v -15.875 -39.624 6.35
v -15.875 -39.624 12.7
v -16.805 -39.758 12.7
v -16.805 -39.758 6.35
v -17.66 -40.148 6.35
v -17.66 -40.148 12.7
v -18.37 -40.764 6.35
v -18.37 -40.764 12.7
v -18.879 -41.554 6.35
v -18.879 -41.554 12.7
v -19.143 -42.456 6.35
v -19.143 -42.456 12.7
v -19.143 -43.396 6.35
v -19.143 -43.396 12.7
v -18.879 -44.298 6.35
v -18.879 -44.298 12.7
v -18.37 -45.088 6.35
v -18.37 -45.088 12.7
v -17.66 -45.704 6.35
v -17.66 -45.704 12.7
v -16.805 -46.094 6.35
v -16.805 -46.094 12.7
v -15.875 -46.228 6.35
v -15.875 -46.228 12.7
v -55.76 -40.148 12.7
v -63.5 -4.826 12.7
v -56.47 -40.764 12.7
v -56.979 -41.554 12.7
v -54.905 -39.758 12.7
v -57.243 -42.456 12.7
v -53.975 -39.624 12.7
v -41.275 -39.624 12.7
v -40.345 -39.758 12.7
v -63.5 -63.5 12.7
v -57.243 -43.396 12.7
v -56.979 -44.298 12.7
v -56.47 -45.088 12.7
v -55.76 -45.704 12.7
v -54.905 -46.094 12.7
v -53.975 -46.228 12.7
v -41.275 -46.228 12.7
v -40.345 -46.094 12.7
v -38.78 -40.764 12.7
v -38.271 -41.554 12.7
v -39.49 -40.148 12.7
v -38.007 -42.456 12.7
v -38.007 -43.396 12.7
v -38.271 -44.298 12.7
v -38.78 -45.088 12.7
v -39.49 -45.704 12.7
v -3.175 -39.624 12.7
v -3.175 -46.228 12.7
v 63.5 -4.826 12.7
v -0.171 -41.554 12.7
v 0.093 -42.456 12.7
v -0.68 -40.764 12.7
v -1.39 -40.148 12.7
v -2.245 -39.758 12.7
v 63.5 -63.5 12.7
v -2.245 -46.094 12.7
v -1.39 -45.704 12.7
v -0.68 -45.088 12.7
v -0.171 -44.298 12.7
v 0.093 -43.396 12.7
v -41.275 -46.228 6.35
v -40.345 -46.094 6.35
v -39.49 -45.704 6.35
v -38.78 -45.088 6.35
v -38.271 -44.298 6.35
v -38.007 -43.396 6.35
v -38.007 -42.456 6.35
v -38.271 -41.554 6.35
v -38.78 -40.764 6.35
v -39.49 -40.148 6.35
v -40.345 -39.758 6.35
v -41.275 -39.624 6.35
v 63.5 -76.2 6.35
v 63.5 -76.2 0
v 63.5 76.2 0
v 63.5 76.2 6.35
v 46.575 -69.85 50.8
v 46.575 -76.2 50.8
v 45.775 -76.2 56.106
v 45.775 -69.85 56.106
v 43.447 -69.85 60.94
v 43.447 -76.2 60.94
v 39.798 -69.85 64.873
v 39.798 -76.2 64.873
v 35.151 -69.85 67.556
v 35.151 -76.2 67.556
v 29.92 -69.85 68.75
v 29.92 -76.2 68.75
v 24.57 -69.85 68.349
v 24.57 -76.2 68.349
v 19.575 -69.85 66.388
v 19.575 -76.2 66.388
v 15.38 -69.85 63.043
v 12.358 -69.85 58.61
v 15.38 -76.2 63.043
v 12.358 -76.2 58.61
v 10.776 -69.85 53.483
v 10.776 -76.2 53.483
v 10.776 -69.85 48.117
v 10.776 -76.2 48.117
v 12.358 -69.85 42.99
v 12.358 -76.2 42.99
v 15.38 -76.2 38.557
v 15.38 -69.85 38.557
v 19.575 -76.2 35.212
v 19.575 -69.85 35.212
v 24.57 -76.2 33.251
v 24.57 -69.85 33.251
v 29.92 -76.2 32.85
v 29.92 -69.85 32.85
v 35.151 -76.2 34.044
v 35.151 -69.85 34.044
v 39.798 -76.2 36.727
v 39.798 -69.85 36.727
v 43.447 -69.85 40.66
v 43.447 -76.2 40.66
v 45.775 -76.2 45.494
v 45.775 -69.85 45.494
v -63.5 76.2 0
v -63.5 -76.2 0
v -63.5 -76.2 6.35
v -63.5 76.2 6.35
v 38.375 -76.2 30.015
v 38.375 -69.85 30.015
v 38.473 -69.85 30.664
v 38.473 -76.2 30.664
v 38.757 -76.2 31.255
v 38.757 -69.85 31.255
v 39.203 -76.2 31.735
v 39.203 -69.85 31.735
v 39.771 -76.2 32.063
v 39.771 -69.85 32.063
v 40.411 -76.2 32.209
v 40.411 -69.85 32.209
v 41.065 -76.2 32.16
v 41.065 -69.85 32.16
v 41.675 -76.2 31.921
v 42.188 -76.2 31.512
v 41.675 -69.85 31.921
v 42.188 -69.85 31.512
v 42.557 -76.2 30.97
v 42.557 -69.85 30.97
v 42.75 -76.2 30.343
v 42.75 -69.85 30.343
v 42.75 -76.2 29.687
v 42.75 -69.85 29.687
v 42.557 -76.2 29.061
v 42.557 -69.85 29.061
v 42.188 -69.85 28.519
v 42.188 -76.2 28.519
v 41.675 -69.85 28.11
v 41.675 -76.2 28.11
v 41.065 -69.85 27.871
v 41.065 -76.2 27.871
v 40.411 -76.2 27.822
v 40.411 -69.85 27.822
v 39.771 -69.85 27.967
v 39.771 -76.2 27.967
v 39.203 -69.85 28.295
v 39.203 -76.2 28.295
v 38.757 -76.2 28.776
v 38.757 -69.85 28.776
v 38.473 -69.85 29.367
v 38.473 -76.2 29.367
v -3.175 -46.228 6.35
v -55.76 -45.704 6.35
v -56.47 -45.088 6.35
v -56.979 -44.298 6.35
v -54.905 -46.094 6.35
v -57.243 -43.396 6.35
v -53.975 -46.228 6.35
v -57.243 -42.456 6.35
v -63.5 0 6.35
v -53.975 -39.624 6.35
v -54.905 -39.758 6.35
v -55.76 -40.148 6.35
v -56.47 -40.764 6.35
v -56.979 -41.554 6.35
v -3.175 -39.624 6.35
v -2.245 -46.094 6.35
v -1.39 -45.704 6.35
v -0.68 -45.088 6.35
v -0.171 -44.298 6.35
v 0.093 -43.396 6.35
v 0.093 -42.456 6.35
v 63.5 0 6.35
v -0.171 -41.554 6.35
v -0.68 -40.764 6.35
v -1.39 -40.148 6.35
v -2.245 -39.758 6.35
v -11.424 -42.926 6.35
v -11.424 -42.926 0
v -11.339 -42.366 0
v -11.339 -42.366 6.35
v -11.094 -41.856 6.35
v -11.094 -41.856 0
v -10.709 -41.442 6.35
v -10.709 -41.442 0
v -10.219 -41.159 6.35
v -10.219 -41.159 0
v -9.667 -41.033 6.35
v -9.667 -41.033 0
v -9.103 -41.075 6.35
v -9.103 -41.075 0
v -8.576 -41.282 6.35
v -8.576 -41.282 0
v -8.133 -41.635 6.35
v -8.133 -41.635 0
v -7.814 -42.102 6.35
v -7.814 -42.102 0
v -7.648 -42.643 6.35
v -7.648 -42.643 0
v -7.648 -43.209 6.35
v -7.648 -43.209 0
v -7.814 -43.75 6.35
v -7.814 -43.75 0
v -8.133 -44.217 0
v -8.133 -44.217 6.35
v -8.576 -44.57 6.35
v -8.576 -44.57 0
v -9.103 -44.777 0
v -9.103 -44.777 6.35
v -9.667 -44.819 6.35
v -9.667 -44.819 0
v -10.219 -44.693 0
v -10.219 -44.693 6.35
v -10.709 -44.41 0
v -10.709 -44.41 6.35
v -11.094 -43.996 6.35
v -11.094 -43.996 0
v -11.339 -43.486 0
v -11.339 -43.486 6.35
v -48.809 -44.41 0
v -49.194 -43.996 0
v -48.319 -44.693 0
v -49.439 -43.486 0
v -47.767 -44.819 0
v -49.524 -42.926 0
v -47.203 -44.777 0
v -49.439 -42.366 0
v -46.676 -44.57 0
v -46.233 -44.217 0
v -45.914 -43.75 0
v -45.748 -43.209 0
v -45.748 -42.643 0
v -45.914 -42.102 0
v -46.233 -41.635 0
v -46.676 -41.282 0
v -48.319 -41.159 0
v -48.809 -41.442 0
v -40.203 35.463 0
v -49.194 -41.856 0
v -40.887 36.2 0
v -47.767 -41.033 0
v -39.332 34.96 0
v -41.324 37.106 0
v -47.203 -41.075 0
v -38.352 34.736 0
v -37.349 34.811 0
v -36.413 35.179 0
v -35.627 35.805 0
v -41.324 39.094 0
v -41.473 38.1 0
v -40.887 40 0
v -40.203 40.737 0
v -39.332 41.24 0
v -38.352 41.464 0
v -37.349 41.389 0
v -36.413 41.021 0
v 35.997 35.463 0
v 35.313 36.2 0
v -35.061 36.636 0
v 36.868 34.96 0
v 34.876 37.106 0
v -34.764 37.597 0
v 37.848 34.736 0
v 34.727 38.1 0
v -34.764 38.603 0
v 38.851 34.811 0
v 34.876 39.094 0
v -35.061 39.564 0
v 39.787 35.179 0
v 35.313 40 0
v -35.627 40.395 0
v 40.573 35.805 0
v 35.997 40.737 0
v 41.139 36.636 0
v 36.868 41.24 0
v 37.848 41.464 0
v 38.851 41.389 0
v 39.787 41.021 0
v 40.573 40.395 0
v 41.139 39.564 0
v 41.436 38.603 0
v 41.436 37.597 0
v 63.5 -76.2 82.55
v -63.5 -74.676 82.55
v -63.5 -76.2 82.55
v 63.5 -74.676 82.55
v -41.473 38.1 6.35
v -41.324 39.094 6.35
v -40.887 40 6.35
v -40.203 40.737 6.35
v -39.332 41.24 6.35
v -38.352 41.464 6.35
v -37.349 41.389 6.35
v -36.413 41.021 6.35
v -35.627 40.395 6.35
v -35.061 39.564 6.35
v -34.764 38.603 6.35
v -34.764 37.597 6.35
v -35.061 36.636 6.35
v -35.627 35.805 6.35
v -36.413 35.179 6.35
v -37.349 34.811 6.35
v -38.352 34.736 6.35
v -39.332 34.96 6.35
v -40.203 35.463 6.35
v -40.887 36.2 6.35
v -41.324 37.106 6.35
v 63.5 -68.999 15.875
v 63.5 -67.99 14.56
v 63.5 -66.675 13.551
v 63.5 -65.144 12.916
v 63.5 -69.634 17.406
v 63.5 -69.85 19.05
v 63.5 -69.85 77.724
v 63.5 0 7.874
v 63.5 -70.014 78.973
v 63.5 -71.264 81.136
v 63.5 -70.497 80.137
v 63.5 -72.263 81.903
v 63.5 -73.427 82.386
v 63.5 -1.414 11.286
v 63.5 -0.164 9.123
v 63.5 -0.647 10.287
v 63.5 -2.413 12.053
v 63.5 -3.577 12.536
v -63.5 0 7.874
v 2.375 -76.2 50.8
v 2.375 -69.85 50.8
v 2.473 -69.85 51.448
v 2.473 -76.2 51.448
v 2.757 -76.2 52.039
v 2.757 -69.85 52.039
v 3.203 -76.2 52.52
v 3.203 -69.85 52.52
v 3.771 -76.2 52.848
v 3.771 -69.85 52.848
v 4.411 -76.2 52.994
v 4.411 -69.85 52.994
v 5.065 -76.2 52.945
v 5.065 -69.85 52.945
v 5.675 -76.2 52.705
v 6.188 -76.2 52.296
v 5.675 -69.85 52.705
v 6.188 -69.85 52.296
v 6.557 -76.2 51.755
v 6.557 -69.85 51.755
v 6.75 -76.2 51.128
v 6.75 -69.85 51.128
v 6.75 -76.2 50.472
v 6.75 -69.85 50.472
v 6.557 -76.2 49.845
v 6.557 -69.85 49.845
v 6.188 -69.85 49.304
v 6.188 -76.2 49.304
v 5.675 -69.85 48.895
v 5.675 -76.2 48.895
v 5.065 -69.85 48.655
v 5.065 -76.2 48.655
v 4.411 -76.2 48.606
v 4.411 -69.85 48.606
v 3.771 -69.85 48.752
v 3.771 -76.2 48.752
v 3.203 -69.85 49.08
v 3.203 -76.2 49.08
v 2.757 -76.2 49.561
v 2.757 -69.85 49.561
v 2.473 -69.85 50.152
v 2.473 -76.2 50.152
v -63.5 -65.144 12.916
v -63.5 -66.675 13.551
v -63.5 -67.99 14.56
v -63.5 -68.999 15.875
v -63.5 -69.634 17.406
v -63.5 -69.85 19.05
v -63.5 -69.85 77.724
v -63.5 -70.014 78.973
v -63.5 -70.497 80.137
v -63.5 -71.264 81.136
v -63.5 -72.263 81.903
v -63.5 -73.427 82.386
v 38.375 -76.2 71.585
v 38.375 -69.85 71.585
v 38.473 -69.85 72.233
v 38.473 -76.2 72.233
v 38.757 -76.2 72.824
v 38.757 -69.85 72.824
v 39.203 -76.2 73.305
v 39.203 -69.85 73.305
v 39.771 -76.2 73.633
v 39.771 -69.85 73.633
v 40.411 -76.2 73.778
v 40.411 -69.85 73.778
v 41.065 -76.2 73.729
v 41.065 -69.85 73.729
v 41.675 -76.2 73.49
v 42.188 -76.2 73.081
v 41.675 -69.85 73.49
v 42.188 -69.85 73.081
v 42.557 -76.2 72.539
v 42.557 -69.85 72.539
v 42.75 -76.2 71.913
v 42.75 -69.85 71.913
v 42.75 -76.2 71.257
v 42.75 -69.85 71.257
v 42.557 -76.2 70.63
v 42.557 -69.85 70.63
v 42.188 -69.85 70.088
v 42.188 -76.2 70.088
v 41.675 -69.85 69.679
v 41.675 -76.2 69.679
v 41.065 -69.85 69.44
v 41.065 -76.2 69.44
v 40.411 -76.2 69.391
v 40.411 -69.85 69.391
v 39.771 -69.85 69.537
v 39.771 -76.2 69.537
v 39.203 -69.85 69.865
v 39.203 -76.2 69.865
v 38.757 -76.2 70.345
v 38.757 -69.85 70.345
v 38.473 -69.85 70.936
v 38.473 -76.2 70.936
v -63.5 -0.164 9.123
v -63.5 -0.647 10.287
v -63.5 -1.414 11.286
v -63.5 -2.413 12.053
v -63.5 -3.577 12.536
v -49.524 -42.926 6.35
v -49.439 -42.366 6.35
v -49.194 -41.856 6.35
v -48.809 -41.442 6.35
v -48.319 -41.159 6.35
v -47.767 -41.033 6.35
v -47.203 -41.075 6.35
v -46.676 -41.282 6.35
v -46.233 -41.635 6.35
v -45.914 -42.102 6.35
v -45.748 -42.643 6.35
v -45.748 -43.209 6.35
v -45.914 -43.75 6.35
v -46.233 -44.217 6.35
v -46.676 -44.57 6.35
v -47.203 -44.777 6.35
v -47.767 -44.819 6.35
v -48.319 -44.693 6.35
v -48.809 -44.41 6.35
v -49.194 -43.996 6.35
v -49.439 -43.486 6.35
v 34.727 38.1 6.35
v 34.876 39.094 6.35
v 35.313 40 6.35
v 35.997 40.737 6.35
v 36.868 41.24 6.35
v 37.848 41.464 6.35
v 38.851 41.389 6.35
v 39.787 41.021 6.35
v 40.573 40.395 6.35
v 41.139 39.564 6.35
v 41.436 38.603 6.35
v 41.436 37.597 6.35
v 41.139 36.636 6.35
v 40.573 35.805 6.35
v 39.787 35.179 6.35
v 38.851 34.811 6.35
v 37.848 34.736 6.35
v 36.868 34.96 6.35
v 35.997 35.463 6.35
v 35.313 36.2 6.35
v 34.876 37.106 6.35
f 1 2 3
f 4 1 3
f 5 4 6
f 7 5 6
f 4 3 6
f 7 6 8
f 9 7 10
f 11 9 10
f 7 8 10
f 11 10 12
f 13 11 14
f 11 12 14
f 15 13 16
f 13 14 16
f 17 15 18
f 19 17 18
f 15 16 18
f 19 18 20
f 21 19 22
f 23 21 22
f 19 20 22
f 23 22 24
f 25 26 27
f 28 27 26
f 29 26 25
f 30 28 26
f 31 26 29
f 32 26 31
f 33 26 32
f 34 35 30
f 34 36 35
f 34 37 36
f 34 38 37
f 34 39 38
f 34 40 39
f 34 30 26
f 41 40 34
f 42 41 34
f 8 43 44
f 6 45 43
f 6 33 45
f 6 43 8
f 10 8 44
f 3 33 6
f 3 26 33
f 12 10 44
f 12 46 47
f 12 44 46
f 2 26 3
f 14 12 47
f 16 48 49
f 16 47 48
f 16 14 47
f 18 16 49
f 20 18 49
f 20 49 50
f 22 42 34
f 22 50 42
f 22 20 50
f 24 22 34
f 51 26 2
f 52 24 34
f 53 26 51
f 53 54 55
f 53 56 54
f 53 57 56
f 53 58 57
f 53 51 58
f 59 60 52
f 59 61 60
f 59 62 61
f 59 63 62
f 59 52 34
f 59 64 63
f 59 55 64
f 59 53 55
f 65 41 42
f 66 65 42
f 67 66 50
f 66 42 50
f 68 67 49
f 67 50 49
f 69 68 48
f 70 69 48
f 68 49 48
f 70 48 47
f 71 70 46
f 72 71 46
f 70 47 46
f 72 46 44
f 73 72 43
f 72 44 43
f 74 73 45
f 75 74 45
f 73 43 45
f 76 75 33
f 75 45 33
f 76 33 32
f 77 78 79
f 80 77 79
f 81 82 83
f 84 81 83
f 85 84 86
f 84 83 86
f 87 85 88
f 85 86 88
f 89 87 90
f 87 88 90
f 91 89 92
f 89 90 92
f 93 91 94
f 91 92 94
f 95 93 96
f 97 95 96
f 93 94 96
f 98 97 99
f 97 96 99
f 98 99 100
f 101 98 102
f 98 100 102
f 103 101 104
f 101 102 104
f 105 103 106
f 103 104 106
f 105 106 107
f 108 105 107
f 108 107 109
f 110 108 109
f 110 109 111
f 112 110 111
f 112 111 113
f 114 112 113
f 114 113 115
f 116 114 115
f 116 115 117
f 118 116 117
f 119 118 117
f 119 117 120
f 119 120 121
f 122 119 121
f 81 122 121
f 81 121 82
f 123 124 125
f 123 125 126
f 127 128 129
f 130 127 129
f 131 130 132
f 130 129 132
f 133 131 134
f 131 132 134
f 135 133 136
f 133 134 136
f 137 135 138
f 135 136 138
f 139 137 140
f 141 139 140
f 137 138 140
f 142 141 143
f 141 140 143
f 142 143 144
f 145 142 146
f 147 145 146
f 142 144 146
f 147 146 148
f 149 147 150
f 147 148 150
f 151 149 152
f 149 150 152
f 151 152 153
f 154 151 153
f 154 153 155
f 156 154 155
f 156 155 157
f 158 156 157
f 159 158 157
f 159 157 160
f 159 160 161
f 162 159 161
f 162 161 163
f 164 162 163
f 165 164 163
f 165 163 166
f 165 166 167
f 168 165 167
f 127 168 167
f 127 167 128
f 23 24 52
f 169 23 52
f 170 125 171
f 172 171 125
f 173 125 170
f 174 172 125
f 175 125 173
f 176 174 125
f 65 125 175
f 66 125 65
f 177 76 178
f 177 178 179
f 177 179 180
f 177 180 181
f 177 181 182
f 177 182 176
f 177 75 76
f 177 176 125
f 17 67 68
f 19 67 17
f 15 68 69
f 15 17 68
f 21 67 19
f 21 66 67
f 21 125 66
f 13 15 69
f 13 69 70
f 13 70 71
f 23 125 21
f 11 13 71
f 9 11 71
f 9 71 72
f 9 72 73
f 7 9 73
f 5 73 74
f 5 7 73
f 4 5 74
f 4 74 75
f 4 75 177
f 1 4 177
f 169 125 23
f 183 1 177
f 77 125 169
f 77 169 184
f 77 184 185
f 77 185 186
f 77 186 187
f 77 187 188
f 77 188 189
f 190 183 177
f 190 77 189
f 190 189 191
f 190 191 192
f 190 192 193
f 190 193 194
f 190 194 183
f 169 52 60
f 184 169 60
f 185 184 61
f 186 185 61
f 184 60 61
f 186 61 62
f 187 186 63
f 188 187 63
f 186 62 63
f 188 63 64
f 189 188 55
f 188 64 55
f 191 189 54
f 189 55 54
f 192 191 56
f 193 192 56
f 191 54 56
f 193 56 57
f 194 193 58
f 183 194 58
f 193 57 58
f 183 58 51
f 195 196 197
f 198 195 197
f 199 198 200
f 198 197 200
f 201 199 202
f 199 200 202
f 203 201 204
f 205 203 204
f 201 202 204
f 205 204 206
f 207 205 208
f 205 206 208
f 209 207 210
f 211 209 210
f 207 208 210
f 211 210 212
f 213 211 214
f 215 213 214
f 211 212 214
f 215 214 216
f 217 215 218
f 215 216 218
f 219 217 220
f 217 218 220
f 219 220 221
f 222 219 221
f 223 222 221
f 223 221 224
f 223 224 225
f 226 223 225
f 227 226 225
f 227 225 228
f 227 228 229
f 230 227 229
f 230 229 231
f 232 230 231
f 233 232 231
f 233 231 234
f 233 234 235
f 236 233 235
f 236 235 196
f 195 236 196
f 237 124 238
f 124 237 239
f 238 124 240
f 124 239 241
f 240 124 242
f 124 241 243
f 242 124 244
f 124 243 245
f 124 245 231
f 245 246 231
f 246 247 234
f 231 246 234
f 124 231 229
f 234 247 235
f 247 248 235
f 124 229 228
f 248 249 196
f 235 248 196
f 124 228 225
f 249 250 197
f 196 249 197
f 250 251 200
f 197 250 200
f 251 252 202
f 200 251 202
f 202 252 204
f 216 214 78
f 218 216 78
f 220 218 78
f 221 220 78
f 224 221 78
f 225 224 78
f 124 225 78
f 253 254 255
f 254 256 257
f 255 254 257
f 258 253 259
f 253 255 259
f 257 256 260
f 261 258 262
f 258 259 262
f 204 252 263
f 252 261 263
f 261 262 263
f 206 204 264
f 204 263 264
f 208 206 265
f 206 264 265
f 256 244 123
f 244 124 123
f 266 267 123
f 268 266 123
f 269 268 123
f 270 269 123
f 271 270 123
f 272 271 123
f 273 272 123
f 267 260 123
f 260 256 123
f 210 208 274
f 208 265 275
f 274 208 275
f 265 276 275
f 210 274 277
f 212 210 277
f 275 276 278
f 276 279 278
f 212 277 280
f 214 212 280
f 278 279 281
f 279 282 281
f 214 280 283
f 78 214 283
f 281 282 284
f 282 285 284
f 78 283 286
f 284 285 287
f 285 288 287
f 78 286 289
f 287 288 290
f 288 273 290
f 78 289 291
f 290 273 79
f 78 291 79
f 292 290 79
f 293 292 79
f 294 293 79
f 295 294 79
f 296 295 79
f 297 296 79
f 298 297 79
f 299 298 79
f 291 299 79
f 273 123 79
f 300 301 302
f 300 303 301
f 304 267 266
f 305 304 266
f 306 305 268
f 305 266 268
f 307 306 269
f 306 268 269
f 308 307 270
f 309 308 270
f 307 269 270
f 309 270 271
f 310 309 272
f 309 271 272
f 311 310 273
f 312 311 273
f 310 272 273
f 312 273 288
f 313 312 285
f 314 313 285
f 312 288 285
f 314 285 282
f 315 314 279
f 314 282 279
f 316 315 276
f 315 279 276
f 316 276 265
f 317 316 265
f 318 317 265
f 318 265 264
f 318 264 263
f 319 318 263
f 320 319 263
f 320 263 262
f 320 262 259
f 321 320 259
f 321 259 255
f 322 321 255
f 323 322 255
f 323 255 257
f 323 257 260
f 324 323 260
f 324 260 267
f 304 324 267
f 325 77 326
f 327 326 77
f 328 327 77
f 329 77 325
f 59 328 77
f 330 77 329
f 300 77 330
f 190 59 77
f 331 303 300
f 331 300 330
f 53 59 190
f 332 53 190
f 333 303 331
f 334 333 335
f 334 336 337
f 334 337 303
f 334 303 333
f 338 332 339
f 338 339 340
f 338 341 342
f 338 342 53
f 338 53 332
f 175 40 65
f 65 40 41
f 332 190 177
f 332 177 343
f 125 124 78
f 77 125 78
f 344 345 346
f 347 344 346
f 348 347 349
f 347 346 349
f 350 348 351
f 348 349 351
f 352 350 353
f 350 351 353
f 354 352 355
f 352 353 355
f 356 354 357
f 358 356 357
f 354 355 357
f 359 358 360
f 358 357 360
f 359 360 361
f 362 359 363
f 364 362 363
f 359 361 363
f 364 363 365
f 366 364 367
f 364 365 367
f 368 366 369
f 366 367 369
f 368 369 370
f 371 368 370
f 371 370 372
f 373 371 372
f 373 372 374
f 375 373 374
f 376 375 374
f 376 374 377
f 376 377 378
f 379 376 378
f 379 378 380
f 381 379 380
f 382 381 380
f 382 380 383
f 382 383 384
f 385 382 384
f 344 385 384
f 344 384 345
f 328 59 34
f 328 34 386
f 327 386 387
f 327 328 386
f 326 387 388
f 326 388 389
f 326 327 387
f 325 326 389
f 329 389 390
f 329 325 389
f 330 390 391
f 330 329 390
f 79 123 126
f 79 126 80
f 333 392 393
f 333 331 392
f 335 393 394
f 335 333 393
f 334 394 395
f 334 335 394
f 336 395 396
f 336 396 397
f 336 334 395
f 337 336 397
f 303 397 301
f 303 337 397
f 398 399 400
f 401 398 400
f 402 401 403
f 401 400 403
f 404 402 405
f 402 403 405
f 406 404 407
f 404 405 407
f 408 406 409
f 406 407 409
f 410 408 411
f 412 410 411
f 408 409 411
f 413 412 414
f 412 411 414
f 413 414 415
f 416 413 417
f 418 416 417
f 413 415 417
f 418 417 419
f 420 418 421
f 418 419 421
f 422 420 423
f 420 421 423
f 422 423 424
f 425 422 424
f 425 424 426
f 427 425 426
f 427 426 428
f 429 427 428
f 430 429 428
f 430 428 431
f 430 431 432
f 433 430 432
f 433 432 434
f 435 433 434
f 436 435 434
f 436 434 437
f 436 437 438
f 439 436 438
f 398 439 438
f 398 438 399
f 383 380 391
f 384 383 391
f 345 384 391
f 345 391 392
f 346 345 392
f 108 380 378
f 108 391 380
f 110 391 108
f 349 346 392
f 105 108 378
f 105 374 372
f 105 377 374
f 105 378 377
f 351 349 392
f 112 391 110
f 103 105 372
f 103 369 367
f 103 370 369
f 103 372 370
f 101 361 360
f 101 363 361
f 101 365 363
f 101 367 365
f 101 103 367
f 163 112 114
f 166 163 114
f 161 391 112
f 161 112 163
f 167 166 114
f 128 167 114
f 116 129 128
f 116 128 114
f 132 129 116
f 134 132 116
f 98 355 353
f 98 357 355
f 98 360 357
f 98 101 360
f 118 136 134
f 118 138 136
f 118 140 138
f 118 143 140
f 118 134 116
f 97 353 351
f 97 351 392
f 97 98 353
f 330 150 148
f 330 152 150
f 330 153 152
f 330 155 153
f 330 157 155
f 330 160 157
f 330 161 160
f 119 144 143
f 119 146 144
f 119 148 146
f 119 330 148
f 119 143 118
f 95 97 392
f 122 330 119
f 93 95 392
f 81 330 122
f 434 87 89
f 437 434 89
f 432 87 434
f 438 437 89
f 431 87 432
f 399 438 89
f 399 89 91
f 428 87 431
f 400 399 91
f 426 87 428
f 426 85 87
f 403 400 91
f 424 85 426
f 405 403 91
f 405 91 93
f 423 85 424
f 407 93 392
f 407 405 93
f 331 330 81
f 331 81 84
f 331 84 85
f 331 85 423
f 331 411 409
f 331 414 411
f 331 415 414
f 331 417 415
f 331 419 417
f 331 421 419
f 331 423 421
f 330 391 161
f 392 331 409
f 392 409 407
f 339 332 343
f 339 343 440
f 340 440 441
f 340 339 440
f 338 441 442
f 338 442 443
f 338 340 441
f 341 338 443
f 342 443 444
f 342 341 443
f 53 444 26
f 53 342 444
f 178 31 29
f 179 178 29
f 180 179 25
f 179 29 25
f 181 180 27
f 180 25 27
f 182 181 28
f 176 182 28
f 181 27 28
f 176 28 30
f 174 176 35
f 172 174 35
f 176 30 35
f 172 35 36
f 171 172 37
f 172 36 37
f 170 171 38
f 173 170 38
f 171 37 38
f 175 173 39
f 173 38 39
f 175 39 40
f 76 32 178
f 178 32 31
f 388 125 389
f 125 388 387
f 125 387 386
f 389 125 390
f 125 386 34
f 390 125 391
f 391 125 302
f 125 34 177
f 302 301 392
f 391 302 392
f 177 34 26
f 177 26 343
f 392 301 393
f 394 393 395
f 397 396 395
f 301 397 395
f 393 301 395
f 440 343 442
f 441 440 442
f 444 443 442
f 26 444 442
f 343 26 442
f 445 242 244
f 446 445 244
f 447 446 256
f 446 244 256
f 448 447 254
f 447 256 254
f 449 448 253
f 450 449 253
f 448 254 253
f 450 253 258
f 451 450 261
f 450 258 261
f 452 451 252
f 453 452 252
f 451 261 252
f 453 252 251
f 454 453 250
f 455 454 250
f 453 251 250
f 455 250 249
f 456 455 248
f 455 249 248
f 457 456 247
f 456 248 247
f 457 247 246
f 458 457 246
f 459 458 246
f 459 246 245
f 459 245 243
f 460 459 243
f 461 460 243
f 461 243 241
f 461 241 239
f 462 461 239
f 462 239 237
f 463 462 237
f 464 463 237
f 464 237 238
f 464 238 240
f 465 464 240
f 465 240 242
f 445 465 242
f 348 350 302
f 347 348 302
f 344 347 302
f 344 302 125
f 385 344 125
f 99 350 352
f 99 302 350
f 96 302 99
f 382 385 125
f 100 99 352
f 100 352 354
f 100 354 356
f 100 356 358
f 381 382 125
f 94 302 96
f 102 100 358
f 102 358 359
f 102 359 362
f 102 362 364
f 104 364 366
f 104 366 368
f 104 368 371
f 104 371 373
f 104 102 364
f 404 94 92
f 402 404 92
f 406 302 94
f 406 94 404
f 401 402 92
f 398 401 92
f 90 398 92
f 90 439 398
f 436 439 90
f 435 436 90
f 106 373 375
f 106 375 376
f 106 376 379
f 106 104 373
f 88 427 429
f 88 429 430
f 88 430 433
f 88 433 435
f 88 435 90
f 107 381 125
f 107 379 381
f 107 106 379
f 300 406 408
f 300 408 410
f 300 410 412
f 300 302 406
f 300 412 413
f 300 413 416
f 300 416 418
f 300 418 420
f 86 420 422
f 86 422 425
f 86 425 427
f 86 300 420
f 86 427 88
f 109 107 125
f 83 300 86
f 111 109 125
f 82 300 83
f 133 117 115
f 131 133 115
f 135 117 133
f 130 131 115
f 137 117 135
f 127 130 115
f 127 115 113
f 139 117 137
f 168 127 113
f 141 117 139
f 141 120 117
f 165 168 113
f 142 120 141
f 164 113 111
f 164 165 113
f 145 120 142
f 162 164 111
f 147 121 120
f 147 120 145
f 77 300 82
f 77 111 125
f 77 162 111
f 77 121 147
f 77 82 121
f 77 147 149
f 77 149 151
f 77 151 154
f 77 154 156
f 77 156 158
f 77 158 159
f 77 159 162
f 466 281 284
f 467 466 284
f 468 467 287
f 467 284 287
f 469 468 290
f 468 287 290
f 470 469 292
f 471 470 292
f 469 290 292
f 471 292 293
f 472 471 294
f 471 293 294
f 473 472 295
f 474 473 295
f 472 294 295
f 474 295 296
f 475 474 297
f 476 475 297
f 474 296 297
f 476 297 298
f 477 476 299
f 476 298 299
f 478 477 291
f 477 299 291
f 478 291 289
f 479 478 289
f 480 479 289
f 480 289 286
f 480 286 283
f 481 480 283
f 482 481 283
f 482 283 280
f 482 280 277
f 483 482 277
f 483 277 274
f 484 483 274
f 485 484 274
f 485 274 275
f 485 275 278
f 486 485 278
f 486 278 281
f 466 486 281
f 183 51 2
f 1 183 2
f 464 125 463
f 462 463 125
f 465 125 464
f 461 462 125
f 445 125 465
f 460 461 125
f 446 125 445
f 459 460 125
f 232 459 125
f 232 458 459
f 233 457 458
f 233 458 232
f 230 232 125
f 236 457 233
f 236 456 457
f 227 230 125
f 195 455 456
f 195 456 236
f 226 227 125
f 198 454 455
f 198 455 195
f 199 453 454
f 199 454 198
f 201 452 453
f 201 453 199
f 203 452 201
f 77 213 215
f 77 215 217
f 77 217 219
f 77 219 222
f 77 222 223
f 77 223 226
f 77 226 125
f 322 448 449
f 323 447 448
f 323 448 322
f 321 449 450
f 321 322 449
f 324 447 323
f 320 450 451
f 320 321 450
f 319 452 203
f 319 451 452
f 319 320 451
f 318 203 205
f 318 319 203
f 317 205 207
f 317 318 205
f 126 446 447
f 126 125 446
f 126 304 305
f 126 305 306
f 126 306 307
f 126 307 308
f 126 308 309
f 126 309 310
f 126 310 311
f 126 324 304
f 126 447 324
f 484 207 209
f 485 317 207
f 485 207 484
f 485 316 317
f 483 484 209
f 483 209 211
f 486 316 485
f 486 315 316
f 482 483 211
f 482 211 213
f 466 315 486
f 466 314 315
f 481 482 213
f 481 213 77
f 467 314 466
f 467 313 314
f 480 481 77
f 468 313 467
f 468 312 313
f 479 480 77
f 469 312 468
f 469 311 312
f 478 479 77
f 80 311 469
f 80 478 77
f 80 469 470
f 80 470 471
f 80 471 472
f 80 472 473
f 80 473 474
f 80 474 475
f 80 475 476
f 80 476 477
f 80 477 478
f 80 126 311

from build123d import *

# Parameters (mm, degrees)
F0_W      = 127
F0_H      = 152.4
F1_DEPTH  = 6.35
F3_D      = 6.746875
F3_DEPTH  = 10
F3_TIP    = 2.0269657445
F5_D      = 3.7973
F5_DEPTH  = 10
F5_TIP    = 1.1408240143
F7_DEPTH  = 63.5
F9_DEPTH  = 12.701
F10_R     = 18
F11_DEPTH = 25
F13_D     = 4.4


# Not quite as in the source:
# - a length typed as a fraction of an inch, garbled in the dataset ("3 / 203.2 mm" for 3/8 in), is restored


with BuildPart() as f1:
    # F0 (on Top) → F1 (new body)
    with BuildSketch(Plane.XY):
        Rectangle(F0_W, F0_H)
    extrude(amount=F1_DEPTH)

    # F3
    with Locations(Plane.XY.offset(6.35)):
        with Locations((-38.1, 38.1), (38.1, 38.1)):
            Hole(F3_D / 2, depth=F3_DEPTH)
            with Locations((0, 0, -(F3_DEPTH + F3_TIP / 2))):  # 118° drill point
                Cone(0, F3_D / 2, F3_TIP, mode=Mode.SUBTRACT)

    # F5
    with Locations(Plane.XY.offset(6.35)):
        with Locations((-47.625, -42.926), (-9.525, -42.926)):
            Hole(F5_D / 2, depth=F5_DEPTH)
            with Locations((0, 0, -(F5_DEPTH + F5_TIP / 2))):  # 118° drill point
                Cone(0, F5_D / 2, F5_TIP, mode=Mode.SUBTRACT)


with BuildPart() as f7:
    # F6 (on Right) → F7 (new body, symmetric)
    with BuildSketch(Plane.YZ):
        with BuildLine():
            Line((-76.2, 82.55), (-76.2, 6.35))
            Line((-76.2, 6.35), (0, 6.35))
            Line((0, 6.35), (0, 7.874))
            ThreePointArc((0, 7.874), (-1.413502674, 11.286497326), (-4.826, 12.7))
            Line((-4.826, 12.7), (-63.5, 12.7))
            ThreePointArc((-63.5, 12.7), (-67.9901280605, 14.5598719395), (-69.85, 19.05))
            Line((-69.85, 19.05), (-69.85, 77.724))
            ThreePointArc((-69.85, 77.724), (-71.263502674, 81.136497326), (-74.676, 82.55))
            Line((-74.676, 82.55), (-76.2, 82.55))
        make_face()
    extrude(amount=F7_DEPTH, both=True)

    # F8 (on face) → F9 (cut, through all)
    with BuildSketch(Plane.XY.offset(12.7)):
        with BuildLine():
            Line((-41.275, -39.624), (-53.975, -39.624))
            ThreePointArc((-53.975, -39.624), (-57.277, -42.926), (-53.975, -46.228))
            Line((-53.975, -46.228), (-41.275, -46.228))
            ThreePointArc((-41.275, -46.228), (-37.973, -42.926), (-41.275, -39.624))
        make_face()
        with BuildLine():
            Line((-3.175, -39.624), (-15.875, -39.624))
            ThreePointArc((-15.875, -39.624), (-19.177, -42.926), (-15.875, -46.228))
            Line((-15.875, -46.228), (-3.175, -46.228))
            ThreePointArc((-3.175, -46.228), (0.127, -42.926), (-3.175, -39.624))
        make_face()
    extrude(amount=-F9_DEPTH, mode=Mode.SUBTRACT)

    # F10 (on face) → F11 (cut)
    with BuildSketch(Plane.XZ.offset(76.2)):
        with Locations((28.575, 50.8)):
            Circle(F10_R)
    extrude(amount=-F11_DEPTH, mode=Mode.SUBTRACT)

    # F13 (through all)
    with Locations(Plane.XZ.offset(76.2)):
        with Locations((4.575, 50.8), (40.575, 71.5846096908), (40.575, 30.0153903092)):
            Hole(F13_D / 2)


solid = Compound([f1.part, f7.part])
